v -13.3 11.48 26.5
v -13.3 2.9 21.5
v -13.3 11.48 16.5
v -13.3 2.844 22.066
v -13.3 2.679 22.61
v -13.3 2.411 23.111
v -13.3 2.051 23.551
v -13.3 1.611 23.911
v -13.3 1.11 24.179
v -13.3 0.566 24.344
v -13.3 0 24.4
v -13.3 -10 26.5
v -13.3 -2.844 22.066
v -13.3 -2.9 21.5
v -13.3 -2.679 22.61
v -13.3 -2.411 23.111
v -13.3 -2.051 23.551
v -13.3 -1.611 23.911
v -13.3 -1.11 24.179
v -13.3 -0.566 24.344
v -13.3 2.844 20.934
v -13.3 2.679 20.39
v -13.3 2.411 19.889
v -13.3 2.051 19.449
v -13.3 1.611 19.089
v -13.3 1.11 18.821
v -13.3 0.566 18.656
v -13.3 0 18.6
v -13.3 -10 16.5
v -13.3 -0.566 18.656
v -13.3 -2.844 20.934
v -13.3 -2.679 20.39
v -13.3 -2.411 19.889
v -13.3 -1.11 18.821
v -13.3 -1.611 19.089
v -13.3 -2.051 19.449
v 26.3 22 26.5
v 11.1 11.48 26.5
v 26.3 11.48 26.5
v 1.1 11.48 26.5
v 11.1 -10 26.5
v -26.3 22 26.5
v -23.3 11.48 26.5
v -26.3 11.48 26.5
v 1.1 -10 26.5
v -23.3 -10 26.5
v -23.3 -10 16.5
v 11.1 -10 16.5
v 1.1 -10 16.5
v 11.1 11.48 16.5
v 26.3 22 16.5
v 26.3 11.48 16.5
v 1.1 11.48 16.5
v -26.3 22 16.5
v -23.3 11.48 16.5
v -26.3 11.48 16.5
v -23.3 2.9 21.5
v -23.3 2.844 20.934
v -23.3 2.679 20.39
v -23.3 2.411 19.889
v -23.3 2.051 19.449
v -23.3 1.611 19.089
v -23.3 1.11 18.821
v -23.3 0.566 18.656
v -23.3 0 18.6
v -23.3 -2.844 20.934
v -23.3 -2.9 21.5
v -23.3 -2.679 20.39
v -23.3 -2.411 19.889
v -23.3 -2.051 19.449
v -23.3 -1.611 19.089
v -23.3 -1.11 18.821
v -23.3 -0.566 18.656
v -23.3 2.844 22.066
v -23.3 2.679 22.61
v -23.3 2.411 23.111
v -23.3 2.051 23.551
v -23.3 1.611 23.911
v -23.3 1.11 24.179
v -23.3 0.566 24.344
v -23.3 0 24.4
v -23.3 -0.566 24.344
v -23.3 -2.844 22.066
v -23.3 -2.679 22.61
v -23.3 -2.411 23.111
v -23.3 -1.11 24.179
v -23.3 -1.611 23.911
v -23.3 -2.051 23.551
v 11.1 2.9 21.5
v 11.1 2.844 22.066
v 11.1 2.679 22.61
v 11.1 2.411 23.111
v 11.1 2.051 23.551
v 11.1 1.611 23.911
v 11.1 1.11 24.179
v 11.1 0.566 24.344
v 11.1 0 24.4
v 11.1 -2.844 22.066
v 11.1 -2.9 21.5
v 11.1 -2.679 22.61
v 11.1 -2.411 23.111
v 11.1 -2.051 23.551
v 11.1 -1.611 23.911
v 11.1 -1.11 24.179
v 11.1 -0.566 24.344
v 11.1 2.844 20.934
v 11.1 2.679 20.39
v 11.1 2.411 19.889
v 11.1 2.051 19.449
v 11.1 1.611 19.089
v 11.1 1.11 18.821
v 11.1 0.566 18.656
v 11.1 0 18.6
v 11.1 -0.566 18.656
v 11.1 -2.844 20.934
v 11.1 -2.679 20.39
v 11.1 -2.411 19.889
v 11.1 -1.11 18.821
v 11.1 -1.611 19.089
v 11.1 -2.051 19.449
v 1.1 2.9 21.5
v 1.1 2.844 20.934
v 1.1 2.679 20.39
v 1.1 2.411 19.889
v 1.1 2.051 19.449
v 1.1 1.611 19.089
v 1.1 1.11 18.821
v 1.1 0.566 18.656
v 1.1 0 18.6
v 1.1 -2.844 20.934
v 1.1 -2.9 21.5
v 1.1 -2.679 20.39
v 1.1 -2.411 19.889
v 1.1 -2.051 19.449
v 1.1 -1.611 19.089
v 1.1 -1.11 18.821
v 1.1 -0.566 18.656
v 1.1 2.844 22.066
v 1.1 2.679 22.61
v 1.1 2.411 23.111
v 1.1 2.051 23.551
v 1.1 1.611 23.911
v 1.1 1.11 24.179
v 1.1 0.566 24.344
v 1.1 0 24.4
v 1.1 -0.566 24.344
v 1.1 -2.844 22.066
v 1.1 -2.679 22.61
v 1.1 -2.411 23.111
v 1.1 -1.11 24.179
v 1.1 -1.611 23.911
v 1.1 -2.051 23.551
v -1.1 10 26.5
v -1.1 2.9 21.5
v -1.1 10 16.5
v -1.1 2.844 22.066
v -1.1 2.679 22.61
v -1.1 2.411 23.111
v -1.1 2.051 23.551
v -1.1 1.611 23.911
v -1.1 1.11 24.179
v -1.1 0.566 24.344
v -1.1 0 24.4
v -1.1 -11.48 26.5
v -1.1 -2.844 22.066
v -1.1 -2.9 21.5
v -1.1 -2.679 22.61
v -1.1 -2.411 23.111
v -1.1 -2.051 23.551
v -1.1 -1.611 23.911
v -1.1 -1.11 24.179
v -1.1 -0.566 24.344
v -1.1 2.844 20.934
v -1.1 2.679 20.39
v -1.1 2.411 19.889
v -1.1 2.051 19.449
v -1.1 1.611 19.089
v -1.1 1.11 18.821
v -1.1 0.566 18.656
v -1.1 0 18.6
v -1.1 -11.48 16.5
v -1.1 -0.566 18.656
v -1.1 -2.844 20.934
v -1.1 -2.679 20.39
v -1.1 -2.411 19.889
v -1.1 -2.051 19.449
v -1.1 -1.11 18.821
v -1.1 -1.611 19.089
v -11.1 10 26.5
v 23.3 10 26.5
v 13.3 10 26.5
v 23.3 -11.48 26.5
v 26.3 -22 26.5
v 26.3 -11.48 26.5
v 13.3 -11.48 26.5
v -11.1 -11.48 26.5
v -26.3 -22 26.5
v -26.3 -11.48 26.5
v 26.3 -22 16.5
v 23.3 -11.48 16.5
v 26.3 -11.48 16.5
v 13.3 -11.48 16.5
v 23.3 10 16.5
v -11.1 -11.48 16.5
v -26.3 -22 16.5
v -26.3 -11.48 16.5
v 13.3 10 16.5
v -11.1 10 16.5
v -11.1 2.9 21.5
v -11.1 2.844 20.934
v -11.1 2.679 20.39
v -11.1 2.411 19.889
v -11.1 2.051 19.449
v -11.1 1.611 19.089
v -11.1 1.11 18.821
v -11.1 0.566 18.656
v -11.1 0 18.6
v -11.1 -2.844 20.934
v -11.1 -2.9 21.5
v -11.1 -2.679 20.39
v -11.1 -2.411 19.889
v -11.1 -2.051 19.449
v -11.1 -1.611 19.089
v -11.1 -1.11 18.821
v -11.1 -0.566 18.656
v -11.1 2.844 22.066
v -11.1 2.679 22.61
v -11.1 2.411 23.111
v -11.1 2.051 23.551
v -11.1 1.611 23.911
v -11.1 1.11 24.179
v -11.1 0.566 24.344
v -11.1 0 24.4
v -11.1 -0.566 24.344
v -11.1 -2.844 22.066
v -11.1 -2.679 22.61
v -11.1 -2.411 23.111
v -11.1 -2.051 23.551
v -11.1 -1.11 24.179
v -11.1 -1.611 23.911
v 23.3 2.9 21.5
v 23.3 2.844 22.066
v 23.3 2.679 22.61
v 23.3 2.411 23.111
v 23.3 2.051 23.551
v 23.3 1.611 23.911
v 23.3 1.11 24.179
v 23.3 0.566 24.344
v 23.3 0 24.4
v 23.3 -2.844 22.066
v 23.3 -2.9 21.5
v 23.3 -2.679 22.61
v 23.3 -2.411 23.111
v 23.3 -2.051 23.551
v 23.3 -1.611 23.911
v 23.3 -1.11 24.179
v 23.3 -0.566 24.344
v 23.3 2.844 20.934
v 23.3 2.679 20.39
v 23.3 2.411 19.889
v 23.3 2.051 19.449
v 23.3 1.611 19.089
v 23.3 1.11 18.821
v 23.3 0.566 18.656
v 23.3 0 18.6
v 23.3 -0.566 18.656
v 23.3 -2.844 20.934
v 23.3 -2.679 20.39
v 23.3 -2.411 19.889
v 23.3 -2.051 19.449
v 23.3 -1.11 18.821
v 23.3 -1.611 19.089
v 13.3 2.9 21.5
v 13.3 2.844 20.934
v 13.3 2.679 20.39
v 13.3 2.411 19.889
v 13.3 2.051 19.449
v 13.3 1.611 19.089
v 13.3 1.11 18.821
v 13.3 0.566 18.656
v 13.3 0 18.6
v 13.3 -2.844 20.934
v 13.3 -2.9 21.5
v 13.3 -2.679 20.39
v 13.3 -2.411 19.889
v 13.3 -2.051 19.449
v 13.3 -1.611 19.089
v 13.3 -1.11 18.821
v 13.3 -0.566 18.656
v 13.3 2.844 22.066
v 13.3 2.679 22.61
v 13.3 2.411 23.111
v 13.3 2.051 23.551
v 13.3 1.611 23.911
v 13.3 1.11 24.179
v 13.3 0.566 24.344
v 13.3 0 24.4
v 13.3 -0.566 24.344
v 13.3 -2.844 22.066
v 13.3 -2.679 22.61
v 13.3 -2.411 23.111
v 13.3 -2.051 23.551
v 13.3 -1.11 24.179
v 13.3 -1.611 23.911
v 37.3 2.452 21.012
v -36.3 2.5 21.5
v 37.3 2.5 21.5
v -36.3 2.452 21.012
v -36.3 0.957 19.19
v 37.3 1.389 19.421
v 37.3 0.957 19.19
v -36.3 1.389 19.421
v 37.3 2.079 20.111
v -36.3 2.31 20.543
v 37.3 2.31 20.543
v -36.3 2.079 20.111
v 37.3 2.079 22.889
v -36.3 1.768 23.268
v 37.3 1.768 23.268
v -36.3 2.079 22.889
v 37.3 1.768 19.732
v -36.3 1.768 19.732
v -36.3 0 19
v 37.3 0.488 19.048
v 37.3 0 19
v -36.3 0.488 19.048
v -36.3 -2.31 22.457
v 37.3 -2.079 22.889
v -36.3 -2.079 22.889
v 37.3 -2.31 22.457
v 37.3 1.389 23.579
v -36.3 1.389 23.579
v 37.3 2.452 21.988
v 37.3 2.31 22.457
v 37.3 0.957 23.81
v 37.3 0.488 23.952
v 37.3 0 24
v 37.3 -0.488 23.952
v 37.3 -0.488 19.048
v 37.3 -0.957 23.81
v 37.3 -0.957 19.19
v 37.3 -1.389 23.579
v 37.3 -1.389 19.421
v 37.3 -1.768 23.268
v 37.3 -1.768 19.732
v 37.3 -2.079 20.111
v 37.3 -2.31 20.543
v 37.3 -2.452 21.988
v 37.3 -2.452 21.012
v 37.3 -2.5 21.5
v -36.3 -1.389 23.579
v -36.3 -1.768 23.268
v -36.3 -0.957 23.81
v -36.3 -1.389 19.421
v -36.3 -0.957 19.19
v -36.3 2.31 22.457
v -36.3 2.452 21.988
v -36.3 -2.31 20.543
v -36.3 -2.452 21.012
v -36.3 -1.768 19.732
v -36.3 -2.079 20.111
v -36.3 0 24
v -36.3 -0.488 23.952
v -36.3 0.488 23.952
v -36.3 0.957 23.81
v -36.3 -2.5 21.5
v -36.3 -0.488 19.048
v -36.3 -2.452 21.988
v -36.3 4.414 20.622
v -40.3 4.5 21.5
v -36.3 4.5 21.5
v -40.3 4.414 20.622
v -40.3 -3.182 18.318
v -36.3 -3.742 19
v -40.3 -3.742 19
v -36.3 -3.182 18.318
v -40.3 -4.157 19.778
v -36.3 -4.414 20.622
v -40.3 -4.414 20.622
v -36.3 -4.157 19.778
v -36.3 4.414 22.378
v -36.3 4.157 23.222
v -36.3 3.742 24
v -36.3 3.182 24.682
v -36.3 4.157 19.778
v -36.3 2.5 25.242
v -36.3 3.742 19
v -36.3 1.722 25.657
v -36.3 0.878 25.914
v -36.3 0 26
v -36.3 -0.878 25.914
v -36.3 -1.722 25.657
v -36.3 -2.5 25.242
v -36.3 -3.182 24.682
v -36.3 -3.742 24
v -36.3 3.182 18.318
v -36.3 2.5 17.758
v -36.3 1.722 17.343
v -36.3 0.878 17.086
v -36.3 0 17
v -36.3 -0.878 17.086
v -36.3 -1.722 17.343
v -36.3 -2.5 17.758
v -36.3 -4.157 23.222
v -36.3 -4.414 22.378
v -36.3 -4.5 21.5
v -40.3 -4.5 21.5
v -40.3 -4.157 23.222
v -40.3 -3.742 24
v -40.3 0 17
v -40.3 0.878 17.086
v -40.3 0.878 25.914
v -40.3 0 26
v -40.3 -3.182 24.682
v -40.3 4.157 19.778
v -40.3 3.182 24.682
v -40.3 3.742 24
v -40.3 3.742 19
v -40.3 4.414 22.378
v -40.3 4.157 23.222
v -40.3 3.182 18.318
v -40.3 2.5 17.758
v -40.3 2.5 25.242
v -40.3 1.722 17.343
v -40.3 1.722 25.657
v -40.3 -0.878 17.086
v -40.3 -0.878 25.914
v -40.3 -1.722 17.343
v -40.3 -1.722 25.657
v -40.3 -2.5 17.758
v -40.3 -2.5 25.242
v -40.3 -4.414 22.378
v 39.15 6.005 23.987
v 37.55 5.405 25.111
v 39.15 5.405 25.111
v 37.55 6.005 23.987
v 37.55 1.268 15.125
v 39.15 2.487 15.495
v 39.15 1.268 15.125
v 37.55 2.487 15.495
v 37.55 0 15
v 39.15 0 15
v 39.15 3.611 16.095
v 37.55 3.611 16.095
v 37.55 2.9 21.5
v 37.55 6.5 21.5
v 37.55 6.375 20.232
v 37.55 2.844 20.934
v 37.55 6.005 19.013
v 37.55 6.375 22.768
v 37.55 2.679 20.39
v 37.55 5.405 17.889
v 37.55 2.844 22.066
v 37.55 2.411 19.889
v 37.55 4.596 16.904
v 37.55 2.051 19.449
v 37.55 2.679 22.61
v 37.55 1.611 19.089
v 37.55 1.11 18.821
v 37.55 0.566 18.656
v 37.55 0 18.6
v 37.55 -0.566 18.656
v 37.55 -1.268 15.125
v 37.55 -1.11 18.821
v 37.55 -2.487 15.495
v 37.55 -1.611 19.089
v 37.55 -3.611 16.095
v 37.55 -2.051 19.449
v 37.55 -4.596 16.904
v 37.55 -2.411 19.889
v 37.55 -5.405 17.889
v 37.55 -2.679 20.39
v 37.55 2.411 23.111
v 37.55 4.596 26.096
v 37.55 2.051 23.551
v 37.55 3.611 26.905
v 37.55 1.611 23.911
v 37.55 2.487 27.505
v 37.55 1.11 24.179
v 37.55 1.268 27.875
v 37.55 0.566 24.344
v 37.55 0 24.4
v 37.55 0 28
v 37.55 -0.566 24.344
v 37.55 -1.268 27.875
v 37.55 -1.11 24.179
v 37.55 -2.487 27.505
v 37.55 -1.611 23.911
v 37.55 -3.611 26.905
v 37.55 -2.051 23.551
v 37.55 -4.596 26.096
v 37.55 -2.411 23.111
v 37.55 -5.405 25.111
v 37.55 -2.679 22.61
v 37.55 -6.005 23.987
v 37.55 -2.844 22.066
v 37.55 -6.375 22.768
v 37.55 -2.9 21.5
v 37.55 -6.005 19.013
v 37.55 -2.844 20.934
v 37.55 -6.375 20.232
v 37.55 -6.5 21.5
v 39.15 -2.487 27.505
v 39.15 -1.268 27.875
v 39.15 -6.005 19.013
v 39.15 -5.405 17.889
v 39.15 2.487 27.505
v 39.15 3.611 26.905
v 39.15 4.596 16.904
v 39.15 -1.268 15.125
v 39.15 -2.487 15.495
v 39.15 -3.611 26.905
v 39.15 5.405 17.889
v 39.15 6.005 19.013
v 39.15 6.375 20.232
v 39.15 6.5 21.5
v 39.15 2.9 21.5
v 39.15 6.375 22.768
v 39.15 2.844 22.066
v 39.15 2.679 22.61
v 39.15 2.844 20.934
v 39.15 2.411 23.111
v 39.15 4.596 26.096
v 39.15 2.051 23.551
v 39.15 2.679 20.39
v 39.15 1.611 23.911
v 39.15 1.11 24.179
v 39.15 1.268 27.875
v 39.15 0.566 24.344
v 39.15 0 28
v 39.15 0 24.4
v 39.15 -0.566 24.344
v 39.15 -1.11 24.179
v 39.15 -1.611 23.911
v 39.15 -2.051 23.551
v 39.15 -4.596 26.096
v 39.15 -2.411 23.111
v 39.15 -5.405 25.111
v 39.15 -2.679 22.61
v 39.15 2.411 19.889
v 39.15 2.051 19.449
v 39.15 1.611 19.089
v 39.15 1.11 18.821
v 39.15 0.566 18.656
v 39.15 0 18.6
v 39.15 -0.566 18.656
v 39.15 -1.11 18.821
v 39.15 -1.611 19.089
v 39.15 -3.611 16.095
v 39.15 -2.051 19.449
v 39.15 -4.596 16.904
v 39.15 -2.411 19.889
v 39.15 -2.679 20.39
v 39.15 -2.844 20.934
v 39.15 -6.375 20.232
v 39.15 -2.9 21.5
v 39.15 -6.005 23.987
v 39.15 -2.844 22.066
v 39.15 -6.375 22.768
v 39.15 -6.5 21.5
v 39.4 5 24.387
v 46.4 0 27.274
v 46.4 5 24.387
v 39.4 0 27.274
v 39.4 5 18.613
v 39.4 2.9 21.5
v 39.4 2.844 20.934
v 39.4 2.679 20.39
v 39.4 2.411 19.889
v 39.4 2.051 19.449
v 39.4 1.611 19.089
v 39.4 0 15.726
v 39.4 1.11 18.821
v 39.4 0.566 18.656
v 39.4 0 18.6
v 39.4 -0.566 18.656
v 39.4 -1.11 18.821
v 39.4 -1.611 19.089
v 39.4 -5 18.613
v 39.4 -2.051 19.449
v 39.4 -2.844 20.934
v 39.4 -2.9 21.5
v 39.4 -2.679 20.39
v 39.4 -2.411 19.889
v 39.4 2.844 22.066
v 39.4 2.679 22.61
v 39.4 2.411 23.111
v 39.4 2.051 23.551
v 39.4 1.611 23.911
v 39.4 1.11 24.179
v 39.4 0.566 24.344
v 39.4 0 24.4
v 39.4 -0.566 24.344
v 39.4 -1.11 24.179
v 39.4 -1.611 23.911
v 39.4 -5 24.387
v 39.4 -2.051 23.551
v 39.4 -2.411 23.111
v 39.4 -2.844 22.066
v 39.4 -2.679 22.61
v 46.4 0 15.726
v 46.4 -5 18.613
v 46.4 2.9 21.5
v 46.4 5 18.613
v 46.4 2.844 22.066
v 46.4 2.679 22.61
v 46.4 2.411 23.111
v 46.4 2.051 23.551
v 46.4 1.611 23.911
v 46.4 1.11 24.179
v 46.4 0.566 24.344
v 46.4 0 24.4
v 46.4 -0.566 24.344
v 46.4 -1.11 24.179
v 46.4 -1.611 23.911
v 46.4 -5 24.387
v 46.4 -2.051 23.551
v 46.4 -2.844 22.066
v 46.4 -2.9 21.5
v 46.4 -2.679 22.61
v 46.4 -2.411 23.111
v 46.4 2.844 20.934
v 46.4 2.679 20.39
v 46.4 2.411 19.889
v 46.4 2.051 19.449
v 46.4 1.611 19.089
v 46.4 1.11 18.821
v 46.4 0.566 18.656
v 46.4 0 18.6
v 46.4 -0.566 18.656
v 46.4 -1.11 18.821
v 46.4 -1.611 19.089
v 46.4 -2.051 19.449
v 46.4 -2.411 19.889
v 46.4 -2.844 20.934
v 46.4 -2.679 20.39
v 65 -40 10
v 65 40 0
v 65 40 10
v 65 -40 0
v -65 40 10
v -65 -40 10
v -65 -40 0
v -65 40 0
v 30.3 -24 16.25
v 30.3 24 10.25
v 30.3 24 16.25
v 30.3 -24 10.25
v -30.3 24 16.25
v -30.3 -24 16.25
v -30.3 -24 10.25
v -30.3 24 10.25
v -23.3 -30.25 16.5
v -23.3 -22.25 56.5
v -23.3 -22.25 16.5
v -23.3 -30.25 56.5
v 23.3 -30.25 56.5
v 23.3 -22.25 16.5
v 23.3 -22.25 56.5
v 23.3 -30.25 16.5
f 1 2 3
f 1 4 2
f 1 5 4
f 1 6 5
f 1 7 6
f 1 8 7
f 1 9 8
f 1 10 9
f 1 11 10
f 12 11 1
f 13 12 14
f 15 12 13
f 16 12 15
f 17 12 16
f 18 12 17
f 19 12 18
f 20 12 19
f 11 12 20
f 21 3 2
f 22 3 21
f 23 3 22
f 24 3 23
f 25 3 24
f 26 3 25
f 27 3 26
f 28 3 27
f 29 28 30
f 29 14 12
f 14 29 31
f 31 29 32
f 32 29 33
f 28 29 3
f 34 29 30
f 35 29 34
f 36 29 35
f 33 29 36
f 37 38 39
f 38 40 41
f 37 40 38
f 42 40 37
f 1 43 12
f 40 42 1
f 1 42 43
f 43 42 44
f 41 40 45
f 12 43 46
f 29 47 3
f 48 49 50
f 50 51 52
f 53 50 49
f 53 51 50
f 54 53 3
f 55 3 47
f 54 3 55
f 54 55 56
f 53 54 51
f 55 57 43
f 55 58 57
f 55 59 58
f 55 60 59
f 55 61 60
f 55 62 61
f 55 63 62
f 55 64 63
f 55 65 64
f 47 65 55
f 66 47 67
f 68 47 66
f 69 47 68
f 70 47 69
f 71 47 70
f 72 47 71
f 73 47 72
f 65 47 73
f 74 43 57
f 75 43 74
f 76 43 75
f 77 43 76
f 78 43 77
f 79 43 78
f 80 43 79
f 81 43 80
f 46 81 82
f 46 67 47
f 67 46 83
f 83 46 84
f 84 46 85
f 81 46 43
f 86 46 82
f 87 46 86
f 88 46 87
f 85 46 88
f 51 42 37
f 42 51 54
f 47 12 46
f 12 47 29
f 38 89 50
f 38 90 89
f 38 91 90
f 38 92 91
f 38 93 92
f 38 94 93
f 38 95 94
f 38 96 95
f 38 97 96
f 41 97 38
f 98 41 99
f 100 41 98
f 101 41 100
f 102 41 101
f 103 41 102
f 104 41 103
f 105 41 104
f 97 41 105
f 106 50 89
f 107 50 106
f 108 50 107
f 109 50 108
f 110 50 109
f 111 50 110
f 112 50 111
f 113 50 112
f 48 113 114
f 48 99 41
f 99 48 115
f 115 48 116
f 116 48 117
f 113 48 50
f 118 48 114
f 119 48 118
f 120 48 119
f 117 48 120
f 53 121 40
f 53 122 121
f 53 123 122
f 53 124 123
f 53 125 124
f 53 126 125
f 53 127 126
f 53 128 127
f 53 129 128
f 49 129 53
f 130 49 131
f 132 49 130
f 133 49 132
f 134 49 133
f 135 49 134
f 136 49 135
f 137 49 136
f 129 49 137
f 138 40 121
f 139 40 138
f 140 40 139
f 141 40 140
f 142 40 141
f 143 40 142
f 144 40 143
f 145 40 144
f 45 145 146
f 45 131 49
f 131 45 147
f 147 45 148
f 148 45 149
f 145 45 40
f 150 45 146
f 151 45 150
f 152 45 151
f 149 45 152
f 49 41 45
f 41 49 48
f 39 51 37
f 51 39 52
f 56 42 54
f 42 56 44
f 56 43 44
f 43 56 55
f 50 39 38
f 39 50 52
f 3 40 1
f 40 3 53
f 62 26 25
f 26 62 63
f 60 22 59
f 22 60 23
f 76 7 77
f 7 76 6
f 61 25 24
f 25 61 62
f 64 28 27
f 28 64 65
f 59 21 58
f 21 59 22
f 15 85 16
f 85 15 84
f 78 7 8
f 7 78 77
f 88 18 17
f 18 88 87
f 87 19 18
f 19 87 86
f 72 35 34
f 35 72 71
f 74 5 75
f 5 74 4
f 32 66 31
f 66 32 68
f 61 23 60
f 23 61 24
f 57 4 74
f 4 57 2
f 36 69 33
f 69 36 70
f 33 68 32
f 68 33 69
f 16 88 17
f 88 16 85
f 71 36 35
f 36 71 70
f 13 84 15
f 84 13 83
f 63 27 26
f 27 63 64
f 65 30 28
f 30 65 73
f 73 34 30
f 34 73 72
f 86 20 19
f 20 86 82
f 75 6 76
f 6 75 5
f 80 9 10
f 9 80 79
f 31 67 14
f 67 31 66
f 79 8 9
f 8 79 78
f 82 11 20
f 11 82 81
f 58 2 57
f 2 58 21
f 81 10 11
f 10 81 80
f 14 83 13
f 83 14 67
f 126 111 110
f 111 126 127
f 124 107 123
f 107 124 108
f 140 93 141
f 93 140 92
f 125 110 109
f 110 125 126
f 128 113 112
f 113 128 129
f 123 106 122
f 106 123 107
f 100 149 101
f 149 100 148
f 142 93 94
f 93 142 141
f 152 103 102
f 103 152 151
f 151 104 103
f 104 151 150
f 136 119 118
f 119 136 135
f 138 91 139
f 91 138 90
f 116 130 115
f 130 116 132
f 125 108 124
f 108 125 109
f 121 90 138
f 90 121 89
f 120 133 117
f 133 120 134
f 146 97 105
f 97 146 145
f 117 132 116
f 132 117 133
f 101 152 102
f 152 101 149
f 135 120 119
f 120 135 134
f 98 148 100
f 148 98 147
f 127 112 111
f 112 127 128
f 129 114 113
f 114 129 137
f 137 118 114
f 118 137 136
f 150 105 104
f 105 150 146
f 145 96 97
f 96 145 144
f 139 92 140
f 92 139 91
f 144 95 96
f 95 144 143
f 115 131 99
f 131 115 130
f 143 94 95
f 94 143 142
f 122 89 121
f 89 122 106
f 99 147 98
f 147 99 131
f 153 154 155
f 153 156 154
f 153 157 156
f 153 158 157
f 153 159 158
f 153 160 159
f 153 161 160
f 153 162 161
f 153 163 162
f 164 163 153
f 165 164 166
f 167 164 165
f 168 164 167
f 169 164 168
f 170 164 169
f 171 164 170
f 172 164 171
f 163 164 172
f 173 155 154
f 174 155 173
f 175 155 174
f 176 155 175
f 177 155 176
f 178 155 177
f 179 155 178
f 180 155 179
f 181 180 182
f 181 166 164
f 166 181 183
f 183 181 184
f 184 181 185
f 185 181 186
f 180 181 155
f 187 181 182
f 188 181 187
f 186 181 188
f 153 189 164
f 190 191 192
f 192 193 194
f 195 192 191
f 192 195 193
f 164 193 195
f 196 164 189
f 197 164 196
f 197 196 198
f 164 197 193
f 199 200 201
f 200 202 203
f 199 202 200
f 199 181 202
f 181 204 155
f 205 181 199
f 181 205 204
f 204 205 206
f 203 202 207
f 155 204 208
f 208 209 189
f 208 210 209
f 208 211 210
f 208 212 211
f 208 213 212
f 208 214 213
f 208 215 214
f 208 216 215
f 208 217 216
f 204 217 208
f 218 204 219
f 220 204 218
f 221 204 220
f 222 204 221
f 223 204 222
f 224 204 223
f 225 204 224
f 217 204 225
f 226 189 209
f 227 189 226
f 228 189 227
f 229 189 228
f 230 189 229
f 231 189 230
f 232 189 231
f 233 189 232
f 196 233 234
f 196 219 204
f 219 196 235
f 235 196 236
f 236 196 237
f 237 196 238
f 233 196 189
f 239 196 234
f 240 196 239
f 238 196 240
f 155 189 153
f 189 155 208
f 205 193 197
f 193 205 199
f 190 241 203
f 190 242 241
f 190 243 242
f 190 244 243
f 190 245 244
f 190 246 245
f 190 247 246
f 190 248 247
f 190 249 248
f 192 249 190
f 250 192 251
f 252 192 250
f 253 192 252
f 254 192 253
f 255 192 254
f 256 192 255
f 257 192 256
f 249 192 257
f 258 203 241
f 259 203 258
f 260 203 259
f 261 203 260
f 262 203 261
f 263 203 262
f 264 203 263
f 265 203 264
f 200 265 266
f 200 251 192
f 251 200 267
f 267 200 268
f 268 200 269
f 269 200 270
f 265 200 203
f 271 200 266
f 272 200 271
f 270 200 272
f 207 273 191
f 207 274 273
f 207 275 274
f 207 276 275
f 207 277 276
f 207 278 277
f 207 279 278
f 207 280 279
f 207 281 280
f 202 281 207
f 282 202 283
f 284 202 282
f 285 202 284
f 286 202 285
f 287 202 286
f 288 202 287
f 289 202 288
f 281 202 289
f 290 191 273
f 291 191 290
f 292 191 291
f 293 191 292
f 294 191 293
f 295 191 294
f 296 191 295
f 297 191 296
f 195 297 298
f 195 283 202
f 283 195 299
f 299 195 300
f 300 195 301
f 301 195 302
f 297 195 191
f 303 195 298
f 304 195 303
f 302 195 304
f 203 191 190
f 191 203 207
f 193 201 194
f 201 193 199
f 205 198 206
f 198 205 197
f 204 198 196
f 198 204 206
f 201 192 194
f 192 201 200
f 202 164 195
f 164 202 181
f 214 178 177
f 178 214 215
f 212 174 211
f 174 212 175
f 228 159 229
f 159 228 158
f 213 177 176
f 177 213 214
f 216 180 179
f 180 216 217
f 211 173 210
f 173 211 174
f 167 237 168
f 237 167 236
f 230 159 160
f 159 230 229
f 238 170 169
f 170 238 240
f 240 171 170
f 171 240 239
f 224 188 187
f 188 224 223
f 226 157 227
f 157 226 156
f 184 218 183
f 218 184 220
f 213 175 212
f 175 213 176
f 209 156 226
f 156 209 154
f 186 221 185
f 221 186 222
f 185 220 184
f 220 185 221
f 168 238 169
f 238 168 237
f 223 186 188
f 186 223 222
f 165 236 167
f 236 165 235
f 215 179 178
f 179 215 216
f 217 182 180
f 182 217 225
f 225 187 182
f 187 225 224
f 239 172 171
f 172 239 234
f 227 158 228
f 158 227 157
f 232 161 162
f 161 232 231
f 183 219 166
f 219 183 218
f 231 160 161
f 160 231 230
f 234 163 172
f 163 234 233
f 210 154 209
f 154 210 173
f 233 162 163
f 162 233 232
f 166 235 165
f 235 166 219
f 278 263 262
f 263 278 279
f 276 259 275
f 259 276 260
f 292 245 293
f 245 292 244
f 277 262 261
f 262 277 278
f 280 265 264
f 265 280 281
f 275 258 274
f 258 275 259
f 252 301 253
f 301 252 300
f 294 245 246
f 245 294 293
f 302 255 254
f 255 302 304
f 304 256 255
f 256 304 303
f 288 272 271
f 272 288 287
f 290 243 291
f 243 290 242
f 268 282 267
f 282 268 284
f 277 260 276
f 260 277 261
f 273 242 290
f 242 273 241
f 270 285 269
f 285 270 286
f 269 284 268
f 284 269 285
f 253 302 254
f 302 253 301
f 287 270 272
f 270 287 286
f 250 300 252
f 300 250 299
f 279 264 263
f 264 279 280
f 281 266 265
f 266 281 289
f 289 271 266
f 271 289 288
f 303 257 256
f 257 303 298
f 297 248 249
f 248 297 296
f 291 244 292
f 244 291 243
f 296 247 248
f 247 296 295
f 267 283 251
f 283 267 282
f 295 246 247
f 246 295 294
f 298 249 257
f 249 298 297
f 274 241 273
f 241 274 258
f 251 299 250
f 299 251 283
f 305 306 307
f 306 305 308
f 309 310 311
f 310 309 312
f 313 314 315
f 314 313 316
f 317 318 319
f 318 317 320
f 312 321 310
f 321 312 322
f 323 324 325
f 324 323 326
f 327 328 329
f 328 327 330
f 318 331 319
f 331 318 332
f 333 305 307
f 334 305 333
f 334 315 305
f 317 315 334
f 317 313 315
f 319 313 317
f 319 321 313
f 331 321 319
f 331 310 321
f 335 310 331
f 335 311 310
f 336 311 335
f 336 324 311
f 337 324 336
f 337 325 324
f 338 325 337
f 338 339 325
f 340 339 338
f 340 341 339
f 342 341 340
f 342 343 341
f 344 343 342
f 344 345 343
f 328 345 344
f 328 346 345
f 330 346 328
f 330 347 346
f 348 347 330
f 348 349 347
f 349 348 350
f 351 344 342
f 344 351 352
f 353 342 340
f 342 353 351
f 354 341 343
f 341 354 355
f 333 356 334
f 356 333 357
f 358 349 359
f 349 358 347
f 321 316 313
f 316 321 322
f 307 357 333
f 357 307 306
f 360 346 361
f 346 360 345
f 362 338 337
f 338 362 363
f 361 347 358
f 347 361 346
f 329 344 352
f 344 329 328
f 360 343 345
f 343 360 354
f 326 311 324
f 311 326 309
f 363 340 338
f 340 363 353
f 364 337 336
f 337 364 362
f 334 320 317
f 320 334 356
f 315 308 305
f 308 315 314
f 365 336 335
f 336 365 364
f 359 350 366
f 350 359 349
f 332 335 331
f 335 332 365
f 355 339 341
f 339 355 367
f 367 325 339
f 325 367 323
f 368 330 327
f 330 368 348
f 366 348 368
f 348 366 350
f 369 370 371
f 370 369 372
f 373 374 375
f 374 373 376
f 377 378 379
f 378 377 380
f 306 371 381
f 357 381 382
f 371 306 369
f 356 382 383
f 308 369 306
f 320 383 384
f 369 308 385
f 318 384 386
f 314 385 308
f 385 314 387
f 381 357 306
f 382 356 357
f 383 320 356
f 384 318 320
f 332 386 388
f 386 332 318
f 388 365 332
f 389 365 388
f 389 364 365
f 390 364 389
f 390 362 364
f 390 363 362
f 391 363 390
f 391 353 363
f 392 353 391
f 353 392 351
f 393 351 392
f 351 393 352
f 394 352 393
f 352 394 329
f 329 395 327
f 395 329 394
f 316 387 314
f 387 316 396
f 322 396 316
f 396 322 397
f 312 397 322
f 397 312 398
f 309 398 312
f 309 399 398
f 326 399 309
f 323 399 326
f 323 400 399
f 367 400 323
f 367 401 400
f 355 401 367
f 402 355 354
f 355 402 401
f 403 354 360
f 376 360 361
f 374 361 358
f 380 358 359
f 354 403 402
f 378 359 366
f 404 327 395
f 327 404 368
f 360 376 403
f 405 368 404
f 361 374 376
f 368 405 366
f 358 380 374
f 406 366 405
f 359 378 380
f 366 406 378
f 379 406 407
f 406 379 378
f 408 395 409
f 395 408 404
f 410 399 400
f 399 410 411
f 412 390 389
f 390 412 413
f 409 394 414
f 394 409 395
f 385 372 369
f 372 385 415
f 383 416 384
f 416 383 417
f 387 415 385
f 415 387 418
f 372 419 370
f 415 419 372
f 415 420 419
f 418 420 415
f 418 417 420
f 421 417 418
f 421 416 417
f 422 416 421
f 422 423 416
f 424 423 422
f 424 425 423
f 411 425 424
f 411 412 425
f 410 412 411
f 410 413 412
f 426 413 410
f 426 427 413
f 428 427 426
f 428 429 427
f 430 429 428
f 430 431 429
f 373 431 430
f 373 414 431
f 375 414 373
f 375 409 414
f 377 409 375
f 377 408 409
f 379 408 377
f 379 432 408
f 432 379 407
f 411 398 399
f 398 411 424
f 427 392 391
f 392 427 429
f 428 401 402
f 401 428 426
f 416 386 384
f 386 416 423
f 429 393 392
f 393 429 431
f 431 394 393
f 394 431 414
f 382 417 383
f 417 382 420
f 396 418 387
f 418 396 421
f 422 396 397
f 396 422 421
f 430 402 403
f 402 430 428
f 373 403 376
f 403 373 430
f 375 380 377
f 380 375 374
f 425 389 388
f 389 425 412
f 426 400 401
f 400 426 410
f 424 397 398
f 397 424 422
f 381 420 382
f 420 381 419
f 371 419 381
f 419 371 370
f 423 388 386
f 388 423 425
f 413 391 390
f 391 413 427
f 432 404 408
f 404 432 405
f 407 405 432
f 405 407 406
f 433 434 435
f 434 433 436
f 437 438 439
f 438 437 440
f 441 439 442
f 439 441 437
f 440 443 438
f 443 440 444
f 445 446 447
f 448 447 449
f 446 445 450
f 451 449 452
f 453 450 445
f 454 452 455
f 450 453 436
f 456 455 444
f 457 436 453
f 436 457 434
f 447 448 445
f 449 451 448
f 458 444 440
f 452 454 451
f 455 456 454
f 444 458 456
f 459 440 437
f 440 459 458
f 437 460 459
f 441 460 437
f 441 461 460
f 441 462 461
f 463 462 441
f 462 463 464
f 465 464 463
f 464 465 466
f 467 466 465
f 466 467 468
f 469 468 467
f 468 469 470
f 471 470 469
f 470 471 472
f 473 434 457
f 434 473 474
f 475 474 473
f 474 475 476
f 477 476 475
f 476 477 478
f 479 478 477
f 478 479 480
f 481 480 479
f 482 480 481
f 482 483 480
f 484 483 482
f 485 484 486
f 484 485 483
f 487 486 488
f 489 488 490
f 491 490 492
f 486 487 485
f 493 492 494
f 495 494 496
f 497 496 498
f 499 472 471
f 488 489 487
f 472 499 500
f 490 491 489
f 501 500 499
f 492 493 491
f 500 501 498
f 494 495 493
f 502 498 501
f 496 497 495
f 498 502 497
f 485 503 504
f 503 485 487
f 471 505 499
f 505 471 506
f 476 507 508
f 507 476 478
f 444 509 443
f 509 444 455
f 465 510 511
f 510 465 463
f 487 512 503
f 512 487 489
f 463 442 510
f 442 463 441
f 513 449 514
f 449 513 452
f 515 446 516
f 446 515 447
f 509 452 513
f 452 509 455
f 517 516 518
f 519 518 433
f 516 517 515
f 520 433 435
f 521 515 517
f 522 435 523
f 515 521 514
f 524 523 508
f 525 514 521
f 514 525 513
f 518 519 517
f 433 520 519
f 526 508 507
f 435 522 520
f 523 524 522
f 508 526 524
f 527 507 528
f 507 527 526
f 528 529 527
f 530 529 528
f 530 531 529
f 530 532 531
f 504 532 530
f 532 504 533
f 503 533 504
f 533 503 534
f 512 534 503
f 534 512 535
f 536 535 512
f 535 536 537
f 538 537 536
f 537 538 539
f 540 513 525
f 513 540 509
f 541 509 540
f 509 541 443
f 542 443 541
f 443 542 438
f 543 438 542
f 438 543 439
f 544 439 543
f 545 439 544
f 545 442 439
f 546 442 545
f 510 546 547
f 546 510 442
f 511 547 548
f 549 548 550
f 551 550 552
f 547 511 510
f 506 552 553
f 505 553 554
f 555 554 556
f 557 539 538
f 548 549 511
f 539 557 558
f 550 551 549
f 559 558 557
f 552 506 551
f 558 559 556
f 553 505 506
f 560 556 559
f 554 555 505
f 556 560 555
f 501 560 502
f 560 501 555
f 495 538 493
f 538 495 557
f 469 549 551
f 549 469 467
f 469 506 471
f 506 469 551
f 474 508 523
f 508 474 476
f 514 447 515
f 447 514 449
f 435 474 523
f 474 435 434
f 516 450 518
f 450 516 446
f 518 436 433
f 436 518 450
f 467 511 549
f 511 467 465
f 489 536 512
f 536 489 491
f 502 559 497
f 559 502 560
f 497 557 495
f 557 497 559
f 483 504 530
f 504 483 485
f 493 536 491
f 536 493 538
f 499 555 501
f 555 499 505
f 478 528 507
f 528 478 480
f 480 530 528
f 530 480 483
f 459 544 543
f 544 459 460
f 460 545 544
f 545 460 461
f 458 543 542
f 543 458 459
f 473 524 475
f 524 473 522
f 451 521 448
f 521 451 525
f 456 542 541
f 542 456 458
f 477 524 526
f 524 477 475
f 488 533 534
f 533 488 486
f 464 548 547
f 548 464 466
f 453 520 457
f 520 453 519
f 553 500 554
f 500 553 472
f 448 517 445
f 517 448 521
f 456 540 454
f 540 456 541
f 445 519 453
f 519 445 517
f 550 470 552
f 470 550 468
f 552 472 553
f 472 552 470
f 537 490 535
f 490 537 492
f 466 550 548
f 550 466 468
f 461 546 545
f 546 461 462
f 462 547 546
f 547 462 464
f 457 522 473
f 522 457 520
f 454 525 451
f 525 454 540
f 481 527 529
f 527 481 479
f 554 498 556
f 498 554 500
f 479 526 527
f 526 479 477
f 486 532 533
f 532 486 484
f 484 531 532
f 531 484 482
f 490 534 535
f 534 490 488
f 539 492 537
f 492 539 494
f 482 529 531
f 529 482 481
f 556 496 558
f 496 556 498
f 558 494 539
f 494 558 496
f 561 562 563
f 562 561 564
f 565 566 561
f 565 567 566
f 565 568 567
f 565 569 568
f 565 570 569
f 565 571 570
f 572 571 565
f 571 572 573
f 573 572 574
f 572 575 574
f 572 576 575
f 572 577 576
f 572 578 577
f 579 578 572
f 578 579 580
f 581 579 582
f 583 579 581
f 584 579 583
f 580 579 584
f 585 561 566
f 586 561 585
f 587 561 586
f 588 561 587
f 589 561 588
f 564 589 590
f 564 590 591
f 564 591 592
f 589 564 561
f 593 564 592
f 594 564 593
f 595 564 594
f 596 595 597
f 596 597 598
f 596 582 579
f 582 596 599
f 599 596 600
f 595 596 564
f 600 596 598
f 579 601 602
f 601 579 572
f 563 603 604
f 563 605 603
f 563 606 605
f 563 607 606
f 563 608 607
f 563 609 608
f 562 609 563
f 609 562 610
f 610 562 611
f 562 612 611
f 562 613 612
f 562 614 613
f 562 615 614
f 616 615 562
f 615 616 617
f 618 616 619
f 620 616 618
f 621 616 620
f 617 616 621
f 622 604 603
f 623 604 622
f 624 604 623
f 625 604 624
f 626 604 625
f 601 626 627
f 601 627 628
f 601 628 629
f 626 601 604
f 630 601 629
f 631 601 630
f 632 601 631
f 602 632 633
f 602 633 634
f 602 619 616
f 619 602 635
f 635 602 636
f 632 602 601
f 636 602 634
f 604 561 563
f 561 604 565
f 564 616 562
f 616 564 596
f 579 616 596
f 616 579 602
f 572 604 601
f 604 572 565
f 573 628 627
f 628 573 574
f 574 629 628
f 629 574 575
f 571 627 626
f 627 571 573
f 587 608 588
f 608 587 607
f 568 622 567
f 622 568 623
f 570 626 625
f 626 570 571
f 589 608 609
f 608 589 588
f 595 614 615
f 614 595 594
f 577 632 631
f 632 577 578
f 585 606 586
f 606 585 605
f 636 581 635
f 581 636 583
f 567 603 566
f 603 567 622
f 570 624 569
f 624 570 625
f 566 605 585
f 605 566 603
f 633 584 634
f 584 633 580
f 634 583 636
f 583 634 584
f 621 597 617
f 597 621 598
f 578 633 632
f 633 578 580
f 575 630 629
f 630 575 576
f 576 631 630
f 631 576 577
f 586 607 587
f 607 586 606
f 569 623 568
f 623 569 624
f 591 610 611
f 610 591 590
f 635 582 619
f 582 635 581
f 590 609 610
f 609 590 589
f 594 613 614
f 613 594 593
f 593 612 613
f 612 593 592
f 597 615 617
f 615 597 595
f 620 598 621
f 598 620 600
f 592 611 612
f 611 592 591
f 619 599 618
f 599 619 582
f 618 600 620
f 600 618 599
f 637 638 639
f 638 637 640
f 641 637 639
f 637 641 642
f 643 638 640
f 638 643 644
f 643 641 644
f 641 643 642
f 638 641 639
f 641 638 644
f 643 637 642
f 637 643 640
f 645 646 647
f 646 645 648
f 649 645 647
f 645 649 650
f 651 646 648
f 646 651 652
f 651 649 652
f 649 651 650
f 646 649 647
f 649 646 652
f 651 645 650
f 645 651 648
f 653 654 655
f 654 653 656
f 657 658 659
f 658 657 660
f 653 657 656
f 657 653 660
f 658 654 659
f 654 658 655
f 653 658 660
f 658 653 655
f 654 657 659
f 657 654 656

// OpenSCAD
$fn = 32;

// ------------------------------------------------------------------------
// Comb hinge with flap: leaf 52.6 x 22 mm, pin d5, flap 40 mm
// Every part is its own module, assembly() places every instance.
// ------------------------------------------------------------------------

// --- part 1 ---
module hinge_bed() {
  difference() {
    translate([-65, -40, 0]) cube([130, 80, 10]);
  }
}

// --- part 2 ---
module hinge_riser() {
  difference() {
    translate([-30.3, -24, 0]) cube([60.6, 48, 6]);
  }
}

// --- part 3 ---
module hinge_leaf_a() {
  difference() {
    union() {
      translate([-23.3, -10, -5]) cube([10, 32, 10]);
      translate([1.1, -10, -5]) cube([10, 32, 10]);
      translate([-26.3, 11.48, -5]) cube([52.6, 10.52, 10]);
    }
    translate([-18.3, 0, 0]) rotate([0, 90, 0]) cylinder(h = 12, d = 5.8, center = true);
    translate([6.1, 0, 0]) rotate([0, 90, 0]) cylinder(h = 12, d = 5.8, center = true);
  }
}

// --- part 4 ---
module hinge_leaf_b() {
  difference() {
    union() {
      translate([-11.1, -22, -5]) cube([10, 32, 10]);
      translate([13.3, -22, -5]) cube([10, 32, 10]);
      translate([-26.3, -22, -5]) cube([52.6, 10.52, 10]);
    }
    translate([-6.1, 0, 0]) rotate([0, 90, 0]) cylinder(h = 12, d = 5.8, center = true);
    translate([18.3, 0, 0]) rotate([0, 90, 0]) cylinder(h = 12, d = 5.8, center = true);
  }
}

// --- part 5 ---
module hinge_flap() {
  difference() {
    translate([-23.3, -20, 0]) cube([46.6, 40, 8]);
  }
}

// --- part 6 ---
module hinge_pin() {
  rotate([0, 90, 0]) cylinder(h = 74.6, d = 5, center = true);
  translate([-40.3, 0, 0]) rotate([0, 90, 0]) cylinder(h = 4, d = 9);
}

// --- part 7 ---
module pin_washer() {
  difference() {
      translate([0, 0, 0]) cylinder(h = 1.6, d = 13);
      translate([0, 0, -1]) cylinder(h = 3.6, d = 5.8);
    }
}

// --- part 8 ---
module pin_nut() {
  difference() {
    linear_extrude(height = 7) polygon(points = [[5.774, 0], [2.887, 5], [-2.887, 5], [-5.774, 0], [-2.887, -5], [2.887, -5]]);
    translate([0, 0, -1]) cylinder(h = 9, d = 5.8);
  }
}

// --- assembly ---
module assembly() {
  color([0.80, 0.24, 0.20]) translate([0, 0, 0]) rotate([0, 0, 0]) hinge_bed();
  color([0.20, 0.45, 0.75]) translate([0, 0, 10.25]) rotate([0, 0, 0]) hinge_riser();
  color([0.25, 0.62, 0.32]) translate([0, 0, 21.5]) rotate([0, 0, 0]) hinge_leaf_a();
  color([0.92, 0.70, 0.18]) translate([0, 0, 21.5]) rotate([0, 0, 0]) hinge_leaf_b();
  color([0.58, 0.35, 0.70]) translate([0, -22.25, 36.5]) rotate([90, 0, 0]) hinge_flap();
  color([0.16, 0.66, 0.66]) translate([0, 0, 21.5]) rotate([0, 0, 0]) hinge_pin();
  color([0.85, 0.48, 0.18]) translate([37.55, 0, 21.5]) rotate([0, 90, 0]) pin_washer();
  color([0.55, 0.60, 0.65]) translate([39.4, 0, 21.5]) rotate([0, 90, 0]) pin_nut();
}

assembly();
